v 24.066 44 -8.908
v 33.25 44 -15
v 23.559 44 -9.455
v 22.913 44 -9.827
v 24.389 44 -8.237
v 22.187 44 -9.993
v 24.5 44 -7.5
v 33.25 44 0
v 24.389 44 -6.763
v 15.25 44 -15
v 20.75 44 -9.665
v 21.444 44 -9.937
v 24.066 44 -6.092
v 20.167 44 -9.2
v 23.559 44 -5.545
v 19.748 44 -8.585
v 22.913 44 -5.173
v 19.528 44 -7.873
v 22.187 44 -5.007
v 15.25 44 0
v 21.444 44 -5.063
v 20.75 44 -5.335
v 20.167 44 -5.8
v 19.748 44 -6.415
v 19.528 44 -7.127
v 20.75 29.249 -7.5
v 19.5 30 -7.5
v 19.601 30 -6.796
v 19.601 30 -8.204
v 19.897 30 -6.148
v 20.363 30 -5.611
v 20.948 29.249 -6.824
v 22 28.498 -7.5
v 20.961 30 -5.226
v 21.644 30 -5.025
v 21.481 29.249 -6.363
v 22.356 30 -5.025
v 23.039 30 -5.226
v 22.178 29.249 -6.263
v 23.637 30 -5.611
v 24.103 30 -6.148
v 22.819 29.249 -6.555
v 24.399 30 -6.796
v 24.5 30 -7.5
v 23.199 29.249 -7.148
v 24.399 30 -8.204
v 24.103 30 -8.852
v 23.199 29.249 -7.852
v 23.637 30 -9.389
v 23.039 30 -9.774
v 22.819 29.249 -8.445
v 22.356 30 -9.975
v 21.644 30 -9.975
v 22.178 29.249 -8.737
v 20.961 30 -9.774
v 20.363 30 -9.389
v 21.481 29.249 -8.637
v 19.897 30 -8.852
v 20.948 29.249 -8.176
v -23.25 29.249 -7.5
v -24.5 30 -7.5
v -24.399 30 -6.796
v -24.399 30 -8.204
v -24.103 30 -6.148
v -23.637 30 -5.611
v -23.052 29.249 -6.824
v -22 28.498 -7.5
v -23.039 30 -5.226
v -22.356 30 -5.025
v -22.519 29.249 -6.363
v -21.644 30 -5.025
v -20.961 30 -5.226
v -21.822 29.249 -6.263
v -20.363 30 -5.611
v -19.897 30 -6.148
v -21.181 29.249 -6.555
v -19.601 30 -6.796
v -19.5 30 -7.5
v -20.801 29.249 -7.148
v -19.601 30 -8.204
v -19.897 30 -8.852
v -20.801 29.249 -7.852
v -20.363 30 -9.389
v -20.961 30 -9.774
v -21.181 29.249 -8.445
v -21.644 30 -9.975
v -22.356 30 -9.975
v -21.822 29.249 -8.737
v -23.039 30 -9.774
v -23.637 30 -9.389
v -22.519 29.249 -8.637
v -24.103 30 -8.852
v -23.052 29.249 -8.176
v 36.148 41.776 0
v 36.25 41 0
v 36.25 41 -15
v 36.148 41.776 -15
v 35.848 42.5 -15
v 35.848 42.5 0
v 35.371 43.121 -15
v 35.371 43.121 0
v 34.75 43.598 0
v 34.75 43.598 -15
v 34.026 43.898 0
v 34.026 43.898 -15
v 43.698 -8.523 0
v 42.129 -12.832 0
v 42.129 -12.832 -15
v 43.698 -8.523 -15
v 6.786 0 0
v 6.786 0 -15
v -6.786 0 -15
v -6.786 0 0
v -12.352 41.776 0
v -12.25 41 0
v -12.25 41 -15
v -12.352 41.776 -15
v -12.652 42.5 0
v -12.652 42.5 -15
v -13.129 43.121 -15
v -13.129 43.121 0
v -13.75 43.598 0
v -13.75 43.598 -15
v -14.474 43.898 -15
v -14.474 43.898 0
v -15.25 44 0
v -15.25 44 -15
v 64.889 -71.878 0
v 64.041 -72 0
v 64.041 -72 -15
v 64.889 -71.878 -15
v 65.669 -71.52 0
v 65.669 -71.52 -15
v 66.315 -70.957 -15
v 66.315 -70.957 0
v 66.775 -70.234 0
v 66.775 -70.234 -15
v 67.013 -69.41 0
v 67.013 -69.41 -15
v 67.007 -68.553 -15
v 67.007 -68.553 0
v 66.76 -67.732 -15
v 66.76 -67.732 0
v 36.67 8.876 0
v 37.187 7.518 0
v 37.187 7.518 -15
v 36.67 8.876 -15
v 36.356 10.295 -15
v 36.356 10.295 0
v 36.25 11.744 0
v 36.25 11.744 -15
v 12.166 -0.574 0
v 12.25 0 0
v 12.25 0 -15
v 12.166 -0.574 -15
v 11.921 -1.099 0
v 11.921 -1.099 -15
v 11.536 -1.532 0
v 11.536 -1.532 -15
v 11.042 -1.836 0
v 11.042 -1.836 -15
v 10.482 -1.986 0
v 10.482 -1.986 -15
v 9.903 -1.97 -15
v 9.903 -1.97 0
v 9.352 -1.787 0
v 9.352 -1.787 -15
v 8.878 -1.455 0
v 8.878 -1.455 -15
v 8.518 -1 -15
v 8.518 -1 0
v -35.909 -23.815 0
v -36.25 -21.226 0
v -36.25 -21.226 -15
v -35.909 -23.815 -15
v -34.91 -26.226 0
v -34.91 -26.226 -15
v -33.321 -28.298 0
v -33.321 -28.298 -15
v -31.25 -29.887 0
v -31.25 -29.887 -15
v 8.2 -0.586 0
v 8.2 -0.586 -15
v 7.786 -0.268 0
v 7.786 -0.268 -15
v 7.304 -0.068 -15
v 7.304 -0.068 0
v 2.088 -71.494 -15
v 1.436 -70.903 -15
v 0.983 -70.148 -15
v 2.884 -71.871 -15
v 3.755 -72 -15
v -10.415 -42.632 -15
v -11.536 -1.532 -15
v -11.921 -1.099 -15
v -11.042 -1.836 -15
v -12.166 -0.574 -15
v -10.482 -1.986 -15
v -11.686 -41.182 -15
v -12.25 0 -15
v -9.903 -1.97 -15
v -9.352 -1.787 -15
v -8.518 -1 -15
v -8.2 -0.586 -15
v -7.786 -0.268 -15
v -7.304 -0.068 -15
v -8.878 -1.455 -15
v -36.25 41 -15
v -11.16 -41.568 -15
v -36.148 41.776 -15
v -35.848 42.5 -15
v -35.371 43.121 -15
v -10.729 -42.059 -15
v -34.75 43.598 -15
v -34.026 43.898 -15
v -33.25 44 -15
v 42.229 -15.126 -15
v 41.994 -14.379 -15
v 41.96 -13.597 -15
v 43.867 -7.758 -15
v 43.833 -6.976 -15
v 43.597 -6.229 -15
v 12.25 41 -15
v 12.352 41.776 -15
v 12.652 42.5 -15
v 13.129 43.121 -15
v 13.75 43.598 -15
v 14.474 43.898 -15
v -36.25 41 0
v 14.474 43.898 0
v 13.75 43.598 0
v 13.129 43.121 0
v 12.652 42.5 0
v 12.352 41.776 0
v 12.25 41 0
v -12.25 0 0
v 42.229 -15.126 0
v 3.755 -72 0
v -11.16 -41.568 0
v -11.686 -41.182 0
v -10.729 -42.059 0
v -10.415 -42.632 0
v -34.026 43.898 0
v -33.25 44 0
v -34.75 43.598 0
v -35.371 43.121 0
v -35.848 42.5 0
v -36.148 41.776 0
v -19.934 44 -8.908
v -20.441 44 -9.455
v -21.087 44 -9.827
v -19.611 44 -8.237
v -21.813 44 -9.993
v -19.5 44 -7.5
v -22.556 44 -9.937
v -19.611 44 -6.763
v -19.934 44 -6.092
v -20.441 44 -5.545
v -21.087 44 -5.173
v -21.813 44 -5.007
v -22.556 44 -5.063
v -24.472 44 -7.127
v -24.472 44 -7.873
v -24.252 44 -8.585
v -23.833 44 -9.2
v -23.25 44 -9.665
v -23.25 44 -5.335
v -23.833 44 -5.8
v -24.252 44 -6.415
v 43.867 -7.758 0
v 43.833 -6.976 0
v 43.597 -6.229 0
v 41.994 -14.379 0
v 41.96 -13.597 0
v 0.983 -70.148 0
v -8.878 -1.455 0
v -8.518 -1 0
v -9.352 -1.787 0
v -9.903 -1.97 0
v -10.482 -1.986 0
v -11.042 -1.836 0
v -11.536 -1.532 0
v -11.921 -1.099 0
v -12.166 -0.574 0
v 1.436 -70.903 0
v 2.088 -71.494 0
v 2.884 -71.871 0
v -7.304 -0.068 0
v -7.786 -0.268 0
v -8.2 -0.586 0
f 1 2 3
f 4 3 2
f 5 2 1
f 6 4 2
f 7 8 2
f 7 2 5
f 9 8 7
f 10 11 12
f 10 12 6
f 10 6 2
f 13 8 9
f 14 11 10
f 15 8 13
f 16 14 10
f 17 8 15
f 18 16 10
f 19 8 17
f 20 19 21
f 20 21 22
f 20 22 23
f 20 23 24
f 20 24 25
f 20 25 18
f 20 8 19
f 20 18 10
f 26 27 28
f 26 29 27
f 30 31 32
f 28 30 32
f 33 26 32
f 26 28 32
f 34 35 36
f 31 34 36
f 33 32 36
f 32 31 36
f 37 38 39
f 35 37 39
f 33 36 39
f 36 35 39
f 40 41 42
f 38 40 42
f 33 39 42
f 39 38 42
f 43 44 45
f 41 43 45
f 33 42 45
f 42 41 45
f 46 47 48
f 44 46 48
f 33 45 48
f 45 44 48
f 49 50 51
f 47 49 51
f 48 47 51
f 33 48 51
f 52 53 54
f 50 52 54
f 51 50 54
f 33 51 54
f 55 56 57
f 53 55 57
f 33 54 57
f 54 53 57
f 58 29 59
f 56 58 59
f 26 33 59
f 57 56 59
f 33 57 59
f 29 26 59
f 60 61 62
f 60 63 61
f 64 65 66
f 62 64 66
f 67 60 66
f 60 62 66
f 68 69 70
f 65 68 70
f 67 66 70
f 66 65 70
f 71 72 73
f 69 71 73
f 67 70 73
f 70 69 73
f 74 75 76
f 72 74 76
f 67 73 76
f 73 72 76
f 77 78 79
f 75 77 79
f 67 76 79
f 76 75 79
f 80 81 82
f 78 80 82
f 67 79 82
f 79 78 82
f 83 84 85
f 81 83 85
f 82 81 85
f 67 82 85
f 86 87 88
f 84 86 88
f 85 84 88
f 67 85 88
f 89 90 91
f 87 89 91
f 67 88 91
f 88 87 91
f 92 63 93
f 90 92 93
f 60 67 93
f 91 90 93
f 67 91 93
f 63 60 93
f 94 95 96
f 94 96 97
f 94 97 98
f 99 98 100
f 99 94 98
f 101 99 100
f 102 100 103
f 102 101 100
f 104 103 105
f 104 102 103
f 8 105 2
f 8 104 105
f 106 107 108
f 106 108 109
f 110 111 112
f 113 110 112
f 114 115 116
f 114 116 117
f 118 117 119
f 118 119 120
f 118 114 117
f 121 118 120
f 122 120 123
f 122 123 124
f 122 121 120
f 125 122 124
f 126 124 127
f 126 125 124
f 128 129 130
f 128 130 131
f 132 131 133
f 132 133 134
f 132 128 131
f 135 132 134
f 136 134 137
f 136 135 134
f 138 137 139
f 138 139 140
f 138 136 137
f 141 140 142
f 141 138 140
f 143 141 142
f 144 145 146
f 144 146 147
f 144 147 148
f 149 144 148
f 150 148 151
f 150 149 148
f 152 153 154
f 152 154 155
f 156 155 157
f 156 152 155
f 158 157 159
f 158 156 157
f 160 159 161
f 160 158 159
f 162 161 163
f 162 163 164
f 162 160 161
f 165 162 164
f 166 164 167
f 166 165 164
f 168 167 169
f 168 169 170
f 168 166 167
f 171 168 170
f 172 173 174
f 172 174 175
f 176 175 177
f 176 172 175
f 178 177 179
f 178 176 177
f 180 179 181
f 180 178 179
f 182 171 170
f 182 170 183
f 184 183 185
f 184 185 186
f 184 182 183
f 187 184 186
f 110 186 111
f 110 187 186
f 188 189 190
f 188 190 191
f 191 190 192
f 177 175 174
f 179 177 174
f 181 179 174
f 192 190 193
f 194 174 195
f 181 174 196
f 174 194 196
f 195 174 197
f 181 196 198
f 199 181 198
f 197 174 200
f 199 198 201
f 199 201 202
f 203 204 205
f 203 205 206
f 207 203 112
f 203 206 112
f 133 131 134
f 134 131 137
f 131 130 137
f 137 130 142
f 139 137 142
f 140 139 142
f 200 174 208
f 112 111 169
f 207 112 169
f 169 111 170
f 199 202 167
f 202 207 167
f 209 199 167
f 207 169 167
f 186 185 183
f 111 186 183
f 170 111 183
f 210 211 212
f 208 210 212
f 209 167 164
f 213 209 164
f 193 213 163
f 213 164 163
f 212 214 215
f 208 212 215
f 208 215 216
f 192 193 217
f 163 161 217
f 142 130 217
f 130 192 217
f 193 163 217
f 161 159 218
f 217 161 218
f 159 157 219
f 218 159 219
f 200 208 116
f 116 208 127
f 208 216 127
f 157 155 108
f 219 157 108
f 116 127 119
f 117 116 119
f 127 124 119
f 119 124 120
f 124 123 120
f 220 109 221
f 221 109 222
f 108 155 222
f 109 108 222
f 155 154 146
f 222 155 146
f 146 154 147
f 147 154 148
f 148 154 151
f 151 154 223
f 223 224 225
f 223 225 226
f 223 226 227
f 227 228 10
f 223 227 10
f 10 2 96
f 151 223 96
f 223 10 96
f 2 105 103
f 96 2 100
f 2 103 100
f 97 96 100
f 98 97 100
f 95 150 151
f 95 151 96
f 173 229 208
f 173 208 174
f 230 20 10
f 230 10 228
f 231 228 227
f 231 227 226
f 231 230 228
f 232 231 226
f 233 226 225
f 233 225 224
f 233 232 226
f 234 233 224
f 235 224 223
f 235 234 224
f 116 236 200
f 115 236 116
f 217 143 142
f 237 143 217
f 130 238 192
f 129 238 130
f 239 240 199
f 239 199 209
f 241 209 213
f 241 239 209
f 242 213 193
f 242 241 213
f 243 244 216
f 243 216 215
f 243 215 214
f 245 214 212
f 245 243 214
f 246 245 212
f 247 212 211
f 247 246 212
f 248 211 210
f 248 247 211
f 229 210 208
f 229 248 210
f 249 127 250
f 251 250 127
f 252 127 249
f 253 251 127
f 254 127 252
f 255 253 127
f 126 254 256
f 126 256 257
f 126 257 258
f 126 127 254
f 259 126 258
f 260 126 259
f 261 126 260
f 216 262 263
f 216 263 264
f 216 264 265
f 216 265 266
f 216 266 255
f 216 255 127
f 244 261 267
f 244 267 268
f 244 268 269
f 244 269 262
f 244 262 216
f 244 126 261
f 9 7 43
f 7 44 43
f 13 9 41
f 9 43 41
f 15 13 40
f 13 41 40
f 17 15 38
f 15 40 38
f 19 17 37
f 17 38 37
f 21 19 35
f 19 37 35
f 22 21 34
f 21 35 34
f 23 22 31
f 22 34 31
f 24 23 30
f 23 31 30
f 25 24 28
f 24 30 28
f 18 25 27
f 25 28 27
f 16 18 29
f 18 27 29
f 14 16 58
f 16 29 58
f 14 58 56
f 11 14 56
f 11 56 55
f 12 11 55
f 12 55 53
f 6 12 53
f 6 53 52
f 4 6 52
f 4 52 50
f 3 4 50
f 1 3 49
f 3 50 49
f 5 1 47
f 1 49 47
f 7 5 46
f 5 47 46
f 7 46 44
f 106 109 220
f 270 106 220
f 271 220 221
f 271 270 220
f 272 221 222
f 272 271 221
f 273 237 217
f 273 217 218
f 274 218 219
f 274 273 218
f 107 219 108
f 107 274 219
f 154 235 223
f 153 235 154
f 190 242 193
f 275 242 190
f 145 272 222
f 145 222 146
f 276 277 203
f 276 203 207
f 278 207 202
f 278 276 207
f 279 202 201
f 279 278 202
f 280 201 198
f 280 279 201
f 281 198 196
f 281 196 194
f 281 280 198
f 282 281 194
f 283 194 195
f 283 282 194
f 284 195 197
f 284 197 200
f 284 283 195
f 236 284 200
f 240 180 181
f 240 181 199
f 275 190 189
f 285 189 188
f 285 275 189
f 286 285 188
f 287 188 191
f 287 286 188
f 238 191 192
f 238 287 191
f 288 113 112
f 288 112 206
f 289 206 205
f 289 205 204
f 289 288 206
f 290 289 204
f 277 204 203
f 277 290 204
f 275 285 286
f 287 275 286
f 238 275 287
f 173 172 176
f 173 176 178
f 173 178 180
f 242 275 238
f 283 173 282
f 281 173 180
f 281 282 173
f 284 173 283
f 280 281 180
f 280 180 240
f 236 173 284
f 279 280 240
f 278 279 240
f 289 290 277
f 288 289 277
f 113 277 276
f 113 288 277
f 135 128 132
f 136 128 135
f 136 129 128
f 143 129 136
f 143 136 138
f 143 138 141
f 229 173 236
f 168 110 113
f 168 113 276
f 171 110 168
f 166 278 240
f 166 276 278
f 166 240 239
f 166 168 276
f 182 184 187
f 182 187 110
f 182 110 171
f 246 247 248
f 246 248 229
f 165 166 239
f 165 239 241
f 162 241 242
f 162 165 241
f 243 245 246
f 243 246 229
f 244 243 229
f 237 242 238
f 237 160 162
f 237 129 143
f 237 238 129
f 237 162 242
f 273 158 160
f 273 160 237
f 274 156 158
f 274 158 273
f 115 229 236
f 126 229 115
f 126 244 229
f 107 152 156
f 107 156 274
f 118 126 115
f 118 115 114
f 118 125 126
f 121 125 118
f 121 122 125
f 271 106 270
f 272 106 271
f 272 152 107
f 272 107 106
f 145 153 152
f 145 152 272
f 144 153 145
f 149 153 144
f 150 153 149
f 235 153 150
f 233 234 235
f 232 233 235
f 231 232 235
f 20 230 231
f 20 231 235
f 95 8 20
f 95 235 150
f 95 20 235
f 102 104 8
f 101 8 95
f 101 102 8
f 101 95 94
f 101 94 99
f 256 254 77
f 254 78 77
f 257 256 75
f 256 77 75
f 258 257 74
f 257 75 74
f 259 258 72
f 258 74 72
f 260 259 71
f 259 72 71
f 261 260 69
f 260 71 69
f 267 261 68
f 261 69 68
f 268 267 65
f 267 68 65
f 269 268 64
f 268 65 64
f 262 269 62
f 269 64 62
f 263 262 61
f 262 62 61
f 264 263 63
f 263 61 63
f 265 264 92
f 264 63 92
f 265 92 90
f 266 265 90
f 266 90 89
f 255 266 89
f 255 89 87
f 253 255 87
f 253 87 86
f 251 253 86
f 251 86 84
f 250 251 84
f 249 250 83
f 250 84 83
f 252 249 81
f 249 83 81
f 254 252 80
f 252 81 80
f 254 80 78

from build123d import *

# Parameters (mm, degrees)
BASE_EXTRUDE_DEPTH = 15
HOLE1_D            = 5
HOLE1_DEPTH        = 14
HOLE1_TIP          = 1.502151548


with BuildPart() as part:
    # Sketch1 → Base-Extrude (new body)
    with BuildSketch(Plane.XY):
        with BuildLine():
            Line((33.25, 44), (15.25, 44))
            ThreePointArc((15.25, 44), (13.128679656, 43.121320344), (12.25, 41))
            Line((12.25, 41), (12.25, 0))
            ThreePointArc((12.25, 0), (10.76763809, -1.931851653), (8.517949192, -1))
            ThreePointArc((8.517949192, -1), (7.785898385, -0.267949192), (6.785898385, 0))
            Line((6.785898385, 0), (-6.785898385, 0))
            ThreePointArc((-6.785898385, 0), (-7.785898385, -0.267949192), (-8.517949192, -1))
            ThreePointArc((-8.517949192, -1), (-10.76763809, -1.931851653), (-12.25, 0))
            Line((-12.25, 0), (-12.25, 41))
            ThreePointArc((-12.25, 41), (-13.128679656, 43.121320344), (-15.25, 44))
            Line((-15.25, 44), (-33.25, 44))
            ThreePointArc((-33.25, 44), (-35.371320344, 43.121320344), (-36.25, 41))
            Line((-36.25, 41), (-36.25, -21.226497308))
            ThreePointArc((-36.25, -21.226497308), (-34.910254038, -26.226497308), (-31.25, -29.886751346))
            Line((-31.25, -29.886751346), (-11.686313468, -41.181851032))
            ThreePointArc((-11.686313468, -41.181851032), (-10.930794046, -41.801889798), (-10.414674871, -42.631876946))
            Line((-10.414674871, -42.631876946), (0.982897316, -70.148050297))
            ThreePointArc((0.982897316, -70.148050297), (2.087825215, -71.494408837), (3.754535914, -72))
            Line((3.754535914, -72), (64.040943269, -72))
            ThreePointArc((64.040943269, -72), (66.571117606, -70.611898825), (66.75986663, -67.732145215))
            Line((66.75986663, -67.732145215), (42.229318474, -15.126214931))
            ThreePointArc((42.229318474, -15.126214931), (41.951097171, -13.989218308), (42.129163973, -12.832299716))
            Line((42.129163973, -12.832299716), (43.697595308, -8.52307004))
            ThreePointArc((43.697595308, -8.52307004), (43.87566211, -7.366151448), (43.597440806, -6.229154825))
            Line((43.597440806, -6.229154825), (37.18692213, 7.518246841))
            ThreePointArc((37.18692213, 7.518246841), (36.487039929, 9.580033319), (36.25, 11.744429459))
            Line((36.25, 11.744429459), (36.25, 41))
            ThreePointArc((36.25, 41), (35.371320344, 43.121320344), (33.25, 44))
        make_face()
    extrude(amount=-BASE_EXTRUDE_DEPTH)

    # Hole1
    with Locations(Plane(origin=(0, 44, 0), x_dir=(-1, 0, 0), z_dir=(0, 1, 0))):
        with Locations((22, -7.5), (-22, -7.5)):
            Hole(HOLE1_D / 2, depth=HOLE1_DEPTH)
            with Locations((0, 0, -(HOLE1_DEPTH + HOLE1_TIP / 2))):  # 118° drill point
                Cone(0, HOLE1_D / 2, HOLE1_TIP, mode=Mode.SUBTRACT)


solid = part.part
